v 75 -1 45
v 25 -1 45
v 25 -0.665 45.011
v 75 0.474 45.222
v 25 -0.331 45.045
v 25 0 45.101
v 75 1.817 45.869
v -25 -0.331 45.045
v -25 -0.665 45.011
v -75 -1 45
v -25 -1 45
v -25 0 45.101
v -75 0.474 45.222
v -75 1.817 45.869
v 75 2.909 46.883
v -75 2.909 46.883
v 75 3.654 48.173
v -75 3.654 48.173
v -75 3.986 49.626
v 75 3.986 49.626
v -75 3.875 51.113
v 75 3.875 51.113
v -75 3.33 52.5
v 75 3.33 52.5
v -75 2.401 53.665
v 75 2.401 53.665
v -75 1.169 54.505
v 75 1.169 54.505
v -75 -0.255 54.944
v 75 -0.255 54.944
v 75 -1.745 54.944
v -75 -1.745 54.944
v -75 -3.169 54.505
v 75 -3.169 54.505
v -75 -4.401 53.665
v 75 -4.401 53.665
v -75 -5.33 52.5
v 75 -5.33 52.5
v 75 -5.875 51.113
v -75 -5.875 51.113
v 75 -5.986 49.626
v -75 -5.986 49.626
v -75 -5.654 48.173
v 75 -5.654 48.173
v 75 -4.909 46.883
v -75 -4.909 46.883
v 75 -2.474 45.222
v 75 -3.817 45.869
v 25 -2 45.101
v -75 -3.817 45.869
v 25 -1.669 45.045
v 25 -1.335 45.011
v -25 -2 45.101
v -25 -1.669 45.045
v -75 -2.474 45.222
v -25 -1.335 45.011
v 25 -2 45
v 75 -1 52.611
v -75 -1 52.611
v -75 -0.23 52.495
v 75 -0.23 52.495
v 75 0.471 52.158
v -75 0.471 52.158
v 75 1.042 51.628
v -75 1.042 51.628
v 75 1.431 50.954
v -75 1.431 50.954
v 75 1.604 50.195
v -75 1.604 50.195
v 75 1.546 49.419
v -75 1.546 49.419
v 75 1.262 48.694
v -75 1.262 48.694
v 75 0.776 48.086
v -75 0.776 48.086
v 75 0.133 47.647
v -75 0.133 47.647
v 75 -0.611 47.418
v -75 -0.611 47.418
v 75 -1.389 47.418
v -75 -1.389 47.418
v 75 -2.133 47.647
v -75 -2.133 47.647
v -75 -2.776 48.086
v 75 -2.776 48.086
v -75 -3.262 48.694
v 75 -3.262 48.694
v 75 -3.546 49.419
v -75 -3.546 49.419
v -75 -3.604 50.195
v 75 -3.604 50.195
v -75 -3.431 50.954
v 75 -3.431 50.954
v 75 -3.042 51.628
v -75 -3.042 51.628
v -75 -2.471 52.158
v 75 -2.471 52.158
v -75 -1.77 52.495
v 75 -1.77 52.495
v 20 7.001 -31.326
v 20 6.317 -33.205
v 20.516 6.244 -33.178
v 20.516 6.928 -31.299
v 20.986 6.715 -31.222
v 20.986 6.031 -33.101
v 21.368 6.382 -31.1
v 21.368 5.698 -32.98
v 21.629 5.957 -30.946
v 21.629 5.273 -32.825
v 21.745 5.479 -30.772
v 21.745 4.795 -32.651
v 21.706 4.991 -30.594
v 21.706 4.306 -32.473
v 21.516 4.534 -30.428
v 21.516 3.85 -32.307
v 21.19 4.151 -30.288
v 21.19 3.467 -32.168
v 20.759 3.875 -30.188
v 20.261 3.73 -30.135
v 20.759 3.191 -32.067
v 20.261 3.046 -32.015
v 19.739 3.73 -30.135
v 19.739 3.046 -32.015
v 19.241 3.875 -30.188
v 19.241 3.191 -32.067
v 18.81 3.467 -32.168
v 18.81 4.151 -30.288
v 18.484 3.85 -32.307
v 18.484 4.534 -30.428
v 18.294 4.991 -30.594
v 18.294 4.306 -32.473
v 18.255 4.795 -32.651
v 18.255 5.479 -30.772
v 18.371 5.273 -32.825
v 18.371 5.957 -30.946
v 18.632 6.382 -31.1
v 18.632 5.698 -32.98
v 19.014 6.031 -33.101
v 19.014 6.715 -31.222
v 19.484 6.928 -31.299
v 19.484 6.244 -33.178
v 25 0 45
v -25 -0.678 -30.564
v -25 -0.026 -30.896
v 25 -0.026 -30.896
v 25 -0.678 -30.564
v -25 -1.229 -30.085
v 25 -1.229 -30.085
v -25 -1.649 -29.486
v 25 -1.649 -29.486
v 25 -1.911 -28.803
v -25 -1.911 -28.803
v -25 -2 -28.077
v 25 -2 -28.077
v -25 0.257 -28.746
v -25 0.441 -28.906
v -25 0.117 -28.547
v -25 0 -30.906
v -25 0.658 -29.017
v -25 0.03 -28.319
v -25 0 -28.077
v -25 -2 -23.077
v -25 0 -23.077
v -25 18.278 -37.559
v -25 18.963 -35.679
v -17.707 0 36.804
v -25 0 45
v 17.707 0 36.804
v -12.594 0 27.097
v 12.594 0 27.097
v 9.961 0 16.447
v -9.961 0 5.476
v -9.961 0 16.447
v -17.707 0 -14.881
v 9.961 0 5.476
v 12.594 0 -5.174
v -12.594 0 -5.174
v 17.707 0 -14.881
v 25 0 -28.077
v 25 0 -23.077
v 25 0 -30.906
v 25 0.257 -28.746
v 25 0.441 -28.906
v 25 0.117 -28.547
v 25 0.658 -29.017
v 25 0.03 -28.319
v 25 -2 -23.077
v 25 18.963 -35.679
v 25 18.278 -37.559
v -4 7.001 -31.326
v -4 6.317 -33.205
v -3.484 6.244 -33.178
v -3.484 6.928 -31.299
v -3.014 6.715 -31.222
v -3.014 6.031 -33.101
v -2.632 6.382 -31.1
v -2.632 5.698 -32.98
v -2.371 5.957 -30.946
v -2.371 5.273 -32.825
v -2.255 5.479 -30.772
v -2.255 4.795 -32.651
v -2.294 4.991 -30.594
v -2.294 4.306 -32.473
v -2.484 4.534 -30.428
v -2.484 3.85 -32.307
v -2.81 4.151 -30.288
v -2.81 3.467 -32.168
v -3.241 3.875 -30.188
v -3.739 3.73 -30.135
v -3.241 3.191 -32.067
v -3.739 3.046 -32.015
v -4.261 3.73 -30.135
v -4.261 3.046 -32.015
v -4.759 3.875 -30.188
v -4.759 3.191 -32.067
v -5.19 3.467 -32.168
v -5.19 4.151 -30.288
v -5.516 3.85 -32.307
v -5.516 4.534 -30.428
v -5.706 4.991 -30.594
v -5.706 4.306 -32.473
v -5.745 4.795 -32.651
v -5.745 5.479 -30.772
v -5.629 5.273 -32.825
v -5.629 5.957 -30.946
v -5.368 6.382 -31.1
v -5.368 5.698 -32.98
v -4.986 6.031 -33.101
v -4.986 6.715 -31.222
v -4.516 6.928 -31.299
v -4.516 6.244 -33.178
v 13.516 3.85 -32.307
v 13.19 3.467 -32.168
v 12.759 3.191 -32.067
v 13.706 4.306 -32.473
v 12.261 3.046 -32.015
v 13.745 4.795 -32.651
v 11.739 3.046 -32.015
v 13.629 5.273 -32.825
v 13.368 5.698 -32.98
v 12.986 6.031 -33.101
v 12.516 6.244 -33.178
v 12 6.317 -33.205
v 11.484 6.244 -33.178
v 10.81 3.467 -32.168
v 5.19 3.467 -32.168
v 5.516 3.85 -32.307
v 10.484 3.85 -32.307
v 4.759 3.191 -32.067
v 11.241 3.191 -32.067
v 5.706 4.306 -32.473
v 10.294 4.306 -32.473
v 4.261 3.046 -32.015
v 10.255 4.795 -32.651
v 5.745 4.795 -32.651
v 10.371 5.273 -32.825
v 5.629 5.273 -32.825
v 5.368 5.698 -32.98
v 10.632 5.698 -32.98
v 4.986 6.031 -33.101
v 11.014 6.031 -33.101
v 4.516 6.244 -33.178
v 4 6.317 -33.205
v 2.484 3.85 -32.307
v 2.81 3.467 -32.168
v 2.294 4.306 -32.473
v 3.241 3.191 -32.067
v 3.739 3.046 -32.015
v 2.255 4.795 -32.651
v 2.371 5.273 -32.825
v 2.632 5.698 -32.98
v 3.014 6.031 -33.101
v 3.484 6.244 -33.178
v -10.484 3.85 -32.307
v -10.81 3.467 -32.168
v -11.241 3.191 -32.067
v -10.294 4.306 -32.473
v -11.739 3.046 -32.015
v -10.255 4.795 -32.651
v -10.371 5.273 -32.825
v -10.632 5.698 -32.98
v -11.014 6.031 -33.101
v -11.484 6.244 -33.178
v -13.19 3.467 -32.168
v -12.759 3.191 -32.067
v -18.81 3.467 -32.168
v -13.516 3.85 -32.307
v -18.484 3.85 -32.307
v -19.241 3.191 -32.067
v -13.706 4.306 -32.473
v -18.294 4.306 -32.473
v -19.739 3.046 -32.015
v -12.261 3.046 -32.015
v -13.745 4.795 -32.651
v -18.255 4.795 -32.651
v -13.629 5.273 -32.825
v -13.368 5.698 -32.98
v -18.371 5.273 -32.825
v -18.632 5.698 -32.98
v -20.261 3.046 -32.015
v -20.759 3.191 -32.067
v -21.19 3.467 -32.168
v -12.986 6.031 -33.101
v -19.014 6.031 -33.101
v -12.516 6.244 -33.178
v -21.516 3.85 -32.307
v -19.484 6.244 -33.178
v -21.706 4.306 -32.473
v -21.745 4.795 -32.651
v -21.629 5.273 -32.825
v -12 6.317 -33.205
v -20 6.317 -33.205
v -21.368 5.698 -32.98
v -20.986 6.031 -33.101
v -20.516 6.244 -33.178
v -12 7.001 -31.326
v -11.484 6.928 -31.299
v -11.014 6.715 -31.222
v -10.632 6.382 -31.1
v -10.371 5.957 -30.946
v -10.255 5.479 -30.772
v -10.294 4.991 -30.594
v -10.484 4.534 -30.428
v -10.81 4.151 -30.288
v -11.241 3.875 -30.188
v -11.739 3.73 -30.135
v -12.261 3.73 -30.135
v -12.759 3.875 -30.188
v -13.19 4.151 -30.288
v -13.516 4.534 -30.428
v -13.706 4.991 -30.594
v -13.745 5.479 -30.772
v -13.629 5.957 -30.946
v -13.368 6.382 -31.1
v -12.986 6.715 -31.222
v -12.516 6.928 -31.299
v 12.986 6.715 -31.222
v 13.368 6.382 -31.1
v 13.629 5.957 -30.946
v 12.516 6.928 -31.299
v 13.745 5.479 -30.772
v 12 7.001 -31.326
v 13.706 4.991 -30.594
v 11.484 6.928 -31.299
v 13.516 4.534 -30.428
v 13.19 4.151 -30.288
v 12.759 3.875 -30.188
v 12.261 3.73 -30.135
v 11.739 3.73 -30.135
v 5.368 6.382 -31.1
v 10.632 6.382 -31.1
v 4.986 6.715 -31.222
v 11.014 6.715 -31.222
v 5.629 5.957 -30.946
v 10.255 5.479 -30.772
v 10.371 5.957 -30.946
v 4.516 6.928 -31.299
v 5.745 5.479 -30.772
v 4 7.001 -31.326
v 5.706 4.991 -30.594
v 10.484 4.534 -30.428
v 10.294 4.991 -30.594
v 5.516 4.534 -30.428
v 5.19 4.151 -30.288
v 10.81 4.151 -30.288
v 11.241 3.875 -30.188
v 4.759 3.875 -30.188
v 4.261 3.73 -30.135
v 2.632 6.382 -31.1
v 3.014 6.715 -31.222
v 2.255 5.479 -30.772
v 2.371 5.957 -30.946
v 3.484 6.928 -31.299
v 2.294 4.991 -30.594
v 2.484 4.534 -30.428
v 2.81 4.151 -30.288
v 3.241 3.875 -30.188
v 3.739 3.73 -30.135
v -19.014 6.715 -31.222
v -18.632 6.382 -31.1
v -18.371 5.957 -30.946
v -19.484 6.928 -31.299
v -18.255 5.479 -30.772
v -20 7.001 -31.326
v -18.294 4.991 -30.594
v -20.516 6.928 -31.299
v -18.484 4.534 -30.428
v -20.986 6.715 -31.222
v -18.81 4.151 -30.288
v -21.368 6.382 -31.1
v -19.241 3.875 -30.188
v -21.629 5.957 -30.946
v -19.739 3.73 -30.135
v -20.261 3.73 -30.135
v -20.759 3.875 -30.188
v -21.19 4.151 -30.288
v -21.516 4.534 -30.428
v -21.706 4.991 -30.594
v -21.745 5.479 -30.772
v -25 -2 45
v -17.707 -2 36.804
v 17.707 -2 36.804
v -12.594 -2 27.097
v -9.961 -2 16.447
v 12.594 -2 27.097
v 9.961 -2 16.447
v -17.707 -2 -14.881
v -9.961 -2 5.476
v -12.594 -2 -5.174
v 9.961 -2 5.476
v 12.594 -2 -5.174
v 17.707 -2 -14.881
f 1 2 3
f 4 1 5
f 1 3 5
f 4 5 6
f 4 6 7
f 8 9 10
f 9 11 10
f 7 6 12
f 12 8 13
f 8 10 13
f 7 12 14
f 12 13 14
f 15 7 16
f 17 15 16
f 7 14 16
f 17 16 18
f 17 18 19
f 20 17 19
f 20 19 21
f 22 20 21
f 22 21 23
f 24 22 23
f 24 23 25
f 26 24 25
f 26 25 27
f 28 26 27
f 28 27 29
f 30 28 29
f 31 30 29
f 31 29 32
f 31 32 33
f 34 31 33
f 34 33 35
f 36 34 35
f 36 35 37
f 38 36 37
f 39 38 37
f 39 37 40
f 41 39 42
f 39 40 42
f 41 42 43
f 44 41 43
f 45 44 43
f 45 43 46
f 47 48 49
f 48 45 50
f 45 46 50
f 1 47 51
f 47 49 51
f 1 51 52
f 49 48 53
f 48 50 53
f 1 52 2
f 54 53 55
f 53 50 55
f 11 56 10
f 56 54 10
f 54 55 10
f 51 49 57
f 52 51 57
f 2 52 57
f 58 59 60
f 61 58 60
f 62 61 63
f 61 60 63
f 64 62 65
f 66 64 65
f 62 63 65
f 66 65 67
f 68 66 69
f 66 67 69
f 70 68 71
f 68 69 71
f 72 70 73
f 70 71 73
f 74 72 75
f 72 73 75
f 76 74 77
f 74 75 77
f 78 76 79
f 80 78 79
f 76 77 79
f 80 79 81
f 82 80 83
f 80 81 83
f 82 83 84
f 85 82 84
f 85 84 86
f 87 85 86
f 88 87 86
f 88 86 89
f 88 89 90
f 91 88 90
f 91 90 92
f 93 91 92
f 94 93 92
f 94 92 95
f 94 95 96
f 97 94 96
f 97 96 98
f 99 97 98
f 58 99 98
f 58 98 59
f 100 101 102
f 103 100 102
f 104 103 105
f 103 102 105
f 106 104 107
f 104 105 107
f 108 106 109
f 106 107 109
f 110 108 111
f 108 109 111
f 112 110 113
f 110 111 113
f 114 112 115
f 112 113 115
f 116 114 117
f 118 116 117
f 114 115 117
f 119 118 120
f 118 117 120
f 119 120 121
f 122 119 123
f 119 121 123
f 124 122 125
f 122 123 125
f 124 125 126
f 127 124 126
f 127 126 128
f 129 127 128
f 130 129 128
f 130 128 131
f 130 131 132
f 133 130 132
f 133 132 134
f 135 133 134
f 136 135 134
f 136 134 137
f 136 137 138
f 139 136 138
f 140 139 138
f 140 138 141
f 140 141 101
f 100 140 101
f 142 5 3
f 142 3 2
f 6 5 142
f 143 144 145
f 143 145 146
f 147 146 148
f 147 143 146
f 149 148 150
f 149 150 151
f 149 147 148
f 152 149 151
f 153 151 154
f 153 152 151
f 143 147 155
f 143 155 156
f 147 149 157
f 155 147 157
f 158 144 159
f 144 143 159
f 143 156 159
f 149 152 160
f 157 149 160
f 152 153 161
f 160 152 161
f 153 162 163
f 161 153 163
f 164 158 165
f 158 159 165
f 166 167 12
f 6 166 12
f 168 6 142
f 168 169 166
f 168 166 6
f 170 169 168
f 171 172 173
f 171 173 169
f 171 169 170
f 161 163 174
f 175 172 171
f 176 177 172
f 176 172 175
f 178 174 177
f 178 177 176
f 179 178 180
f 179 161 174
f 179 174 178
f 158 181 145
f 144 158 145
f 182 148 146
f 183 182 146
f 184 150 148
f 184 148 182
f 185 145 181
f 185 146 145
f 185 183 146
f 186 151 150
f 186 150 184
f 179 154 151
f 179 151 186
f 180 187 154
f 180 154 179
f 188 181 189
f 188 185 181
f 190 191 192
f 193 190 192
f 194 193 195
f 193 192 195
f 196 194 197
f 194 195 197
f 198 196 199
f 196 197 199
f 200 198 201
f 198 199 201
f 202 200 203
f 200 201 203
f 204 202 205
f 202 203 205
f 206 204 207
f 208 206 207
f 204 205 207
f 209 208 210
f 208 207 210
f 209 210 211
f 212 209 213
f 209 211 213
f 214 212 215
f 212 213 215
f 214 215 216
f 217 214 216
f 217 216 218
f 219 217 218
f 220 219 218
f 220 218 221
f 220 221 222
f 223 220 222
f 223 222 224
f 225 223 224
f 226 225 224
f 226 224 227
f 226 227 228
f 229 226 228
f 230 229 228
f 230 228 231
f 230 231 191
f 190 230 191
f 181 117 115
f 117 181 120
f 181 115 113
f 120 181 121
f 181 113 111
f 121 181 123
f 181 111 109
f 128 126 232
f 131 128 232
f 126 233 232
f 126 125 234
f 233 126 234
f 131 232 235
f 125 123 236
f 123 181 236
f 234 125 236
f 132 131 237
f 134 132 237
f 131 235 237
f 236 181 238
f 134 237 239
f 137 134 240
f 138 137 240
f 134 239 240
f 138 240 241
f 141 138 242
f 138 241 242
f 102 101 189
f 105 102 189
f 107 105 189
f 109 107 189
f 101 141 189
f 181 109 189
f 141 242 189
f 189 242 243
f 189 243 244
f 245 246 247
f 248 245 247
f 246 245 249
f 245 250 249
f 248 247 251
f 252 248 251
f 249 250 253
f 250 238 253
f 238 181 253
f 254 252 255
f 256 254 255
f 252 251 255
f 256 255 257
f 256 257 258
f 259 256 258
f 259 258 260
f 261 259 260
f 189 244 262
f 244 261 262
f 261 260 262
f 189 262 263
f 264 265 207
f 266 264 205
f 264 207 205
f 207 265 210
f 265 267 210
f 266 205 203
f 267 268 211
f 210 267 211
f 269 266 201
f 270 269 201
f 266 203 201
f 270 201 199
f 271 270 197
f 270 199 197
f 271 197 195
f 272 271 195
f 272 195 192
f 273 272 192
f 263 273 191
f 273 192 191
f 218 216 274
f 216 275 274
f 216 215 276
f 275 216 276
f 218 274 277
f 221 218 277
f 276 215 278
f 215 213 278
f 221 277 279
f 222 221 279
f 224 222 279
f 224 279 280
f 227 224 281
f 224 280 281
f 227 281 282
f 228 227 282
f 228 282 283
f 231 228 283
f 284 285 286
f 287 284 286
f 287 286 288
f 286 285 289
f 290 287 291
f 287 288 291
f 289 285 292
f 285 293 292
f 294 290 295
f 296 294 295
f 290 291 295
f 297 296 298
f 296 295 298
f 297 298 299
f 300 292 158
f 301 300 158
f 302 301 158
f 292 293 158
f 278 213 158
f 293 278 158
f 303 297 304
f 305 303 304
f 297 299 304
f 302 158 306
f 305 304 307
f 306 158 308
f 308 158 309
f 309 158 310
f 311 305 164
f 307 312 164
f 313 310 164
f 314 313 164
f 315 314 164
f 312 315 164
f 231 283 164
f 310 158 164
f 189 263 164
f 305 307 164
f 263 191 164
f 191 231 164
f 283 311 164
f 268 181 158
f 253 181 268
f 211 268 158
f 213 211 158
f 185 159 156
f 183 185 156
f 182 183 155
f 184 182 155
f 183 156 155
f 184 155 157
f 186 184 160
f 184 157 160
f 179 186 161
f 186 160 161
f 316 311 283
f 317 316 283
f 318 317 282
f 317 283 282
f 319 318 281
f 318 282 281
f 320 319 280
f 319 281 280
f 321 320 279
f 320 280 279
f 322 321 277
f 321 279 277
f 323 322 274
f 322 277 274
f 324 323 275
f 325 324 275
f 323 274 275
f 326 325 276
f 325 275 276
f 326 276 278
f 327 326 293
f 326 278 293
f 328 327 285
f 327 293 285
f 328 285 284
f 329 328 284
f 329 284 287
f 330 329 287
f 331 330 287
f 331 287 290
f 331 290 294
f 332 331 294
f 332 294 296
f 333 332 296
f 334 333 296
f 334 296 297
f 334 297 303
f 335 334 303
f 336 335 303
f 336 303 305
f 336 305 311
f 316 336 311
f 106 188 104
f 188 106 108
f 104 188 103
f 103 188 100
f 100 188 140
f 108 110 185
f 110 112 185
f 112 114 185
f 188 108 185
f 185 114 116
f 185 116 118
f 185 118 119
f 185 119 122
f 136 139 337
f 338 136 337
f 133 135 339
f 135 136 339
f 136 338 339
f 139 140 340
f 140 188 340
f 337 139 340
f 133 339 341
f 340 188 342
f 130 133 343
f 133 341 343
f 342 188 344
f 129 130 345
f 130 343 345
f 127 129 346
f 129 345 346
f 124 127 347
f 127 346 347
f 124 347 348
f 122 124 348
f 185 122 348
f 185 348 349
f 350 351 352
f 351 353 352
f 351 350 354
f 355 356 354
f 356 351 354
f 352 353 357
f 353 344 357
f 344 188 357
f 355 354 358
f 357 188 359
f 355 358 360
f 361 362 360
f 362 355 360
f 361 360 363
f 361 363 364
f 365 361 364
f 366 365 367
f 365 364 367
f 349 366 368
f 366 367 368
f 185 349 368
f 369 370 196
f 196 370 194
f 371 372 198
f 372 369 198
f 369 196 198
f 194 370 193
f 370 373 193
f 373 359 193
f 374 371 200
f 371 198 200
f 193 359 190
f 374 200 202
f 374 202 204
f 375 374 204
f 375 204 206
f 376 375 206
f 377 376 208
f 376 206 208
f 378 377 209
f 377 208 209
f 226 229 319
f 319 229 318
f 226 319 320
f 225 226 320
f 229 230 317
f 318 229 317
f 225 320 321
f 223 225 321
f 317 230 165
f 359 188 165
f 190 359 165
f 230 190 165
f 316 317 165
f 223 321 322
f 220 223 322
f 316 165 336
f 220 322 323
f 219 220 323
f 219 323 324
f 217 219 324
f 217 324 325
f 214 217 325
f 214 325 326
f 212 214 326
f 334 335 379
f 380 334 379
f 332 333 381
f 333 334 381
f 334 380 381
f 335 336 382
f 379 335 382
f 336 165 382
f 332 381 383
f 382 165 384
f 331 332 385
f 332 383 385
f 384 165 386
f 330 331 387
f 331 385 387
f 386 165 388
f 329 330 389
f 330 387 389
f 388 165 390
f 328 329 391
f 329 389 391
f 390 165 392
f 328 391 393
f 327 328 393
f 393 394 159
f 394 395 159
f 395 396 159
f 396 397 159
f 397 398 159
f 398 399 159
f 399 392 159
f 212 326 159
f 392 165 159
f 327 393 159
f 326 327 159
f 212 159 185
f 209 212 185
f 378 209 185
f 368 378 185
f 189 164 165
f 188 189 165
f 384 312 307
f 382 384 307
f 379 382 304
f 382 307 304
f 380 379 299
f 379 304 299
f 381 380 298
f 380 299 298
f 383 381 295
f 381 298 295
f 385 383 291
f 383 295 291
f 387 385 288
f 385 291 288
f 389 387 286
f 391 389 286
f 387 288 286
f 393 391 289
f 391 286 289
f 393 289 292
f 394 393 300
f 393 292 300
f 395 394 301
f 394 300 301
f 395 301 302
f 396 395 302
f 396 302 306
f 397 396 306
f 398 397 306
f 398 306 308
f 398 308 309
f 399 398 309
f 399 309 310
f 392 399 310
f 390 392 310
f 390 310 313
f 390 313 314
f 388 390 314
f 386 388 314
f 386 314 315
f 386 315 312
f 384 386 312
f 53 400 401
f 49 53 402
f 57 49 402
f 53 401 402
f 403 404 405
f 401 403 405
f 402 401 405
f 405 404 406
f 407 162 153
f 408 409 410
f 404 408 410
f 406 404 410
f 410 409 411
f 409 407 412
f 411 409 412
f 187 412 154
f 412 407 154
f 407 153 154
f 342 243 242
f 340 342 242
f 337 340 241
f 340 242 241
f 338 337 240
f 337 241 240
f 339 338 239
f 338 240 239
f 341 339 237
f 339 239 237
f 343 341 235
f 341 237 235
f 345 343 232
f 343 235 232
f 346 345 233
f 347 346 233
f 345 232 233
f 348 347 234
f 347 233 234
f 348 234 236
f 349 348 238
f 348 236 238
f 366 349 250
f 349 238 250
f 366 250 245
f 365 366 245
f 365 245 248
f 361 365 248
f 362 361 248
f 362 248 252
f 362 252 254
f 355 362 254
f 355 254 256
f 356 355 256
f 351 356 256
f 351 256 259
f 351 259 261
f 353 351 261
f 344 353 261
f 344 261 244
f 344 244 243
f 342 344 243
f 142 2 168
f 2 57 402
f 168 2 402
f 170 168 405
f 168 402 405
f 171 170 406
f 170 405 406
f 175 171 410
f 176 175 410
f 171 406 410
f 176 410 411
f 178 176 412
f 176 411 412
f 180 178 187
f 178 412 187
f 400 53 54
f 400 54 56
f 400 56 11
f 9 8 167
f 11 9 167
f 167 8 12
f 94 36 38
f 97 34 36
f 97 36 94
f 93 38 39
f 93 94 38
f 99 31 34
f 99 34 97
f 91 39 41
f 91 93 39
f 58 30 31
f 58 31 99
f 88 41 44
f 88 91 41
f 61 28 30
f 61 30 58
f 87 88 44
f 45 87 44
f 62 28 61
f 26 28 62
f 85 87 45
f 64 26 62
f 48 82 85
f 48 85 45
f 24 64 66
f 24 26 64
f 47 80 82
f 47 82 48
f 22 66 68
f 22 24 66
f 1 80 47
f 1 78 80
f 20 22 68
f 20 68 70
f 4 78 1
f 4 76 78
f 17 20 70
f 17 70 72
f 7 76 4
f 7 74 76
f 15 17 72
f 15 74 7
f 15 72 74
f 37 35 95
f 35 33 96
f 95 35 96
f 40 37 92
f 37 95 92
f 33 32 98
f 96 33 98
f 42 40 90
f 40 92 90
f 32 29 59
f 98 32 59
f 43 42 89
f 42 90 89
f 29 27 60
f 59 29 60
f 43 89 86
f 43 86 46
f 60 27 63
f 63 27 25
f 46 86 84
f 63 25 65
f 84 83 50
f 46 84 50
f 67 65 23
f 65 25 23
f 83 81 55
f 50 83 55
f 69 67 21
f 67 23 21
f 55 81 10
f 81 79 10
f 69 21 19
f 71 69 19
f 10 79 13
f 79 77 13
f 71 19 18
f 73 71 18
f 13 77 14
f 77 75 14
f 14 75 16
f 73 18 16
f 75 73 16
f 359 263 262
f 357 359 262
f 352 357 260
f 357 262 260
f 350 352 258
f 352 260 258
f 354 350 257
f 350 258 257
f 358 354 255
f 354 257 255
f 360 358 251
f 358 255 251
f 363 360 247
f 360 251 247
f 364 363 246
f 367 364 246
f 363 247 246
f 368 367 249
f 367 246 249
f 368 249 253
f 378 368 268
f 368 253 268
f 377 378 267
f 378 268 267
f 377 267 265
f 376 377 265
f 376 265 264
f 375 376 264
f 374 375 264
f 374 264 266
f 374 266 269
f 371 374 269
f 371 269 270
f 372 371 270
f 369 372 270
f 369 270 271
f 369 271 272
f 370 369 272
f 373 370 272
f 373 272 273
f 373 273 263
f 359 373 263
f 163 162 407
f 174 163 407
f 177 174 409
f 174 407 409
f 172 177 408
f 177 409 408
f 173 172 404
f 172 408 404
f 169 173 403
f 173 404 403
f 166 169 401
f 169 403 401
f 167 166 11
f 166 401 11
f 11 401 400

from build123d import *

# Parameters (mm, degrees)
SKETCH1_W                = 50
SKETCH1_H                = 100
BASE_FLANGE1_DEPTH       = 2
SKETCHED_START           = -25
SKETCHED_BEND1_DEPTH     = 50
SKETCHED_BEND1_2_DEPTH   = 50
CUT_EXTRUDE2_DEPTH       = 60.702826072
BOSS_EXTRUDE2_DEPTH      = 75
BOSS_EXTRUDE2_DEPTH_BACK = 75
SKETCH9_R                = 5
SKETCH10_R               = 1.75
CUT_EXTRUDE3_DEPTH       = 116.029027735
SKETCH11_R               = 2.61136214
CUT_EXTRUDE4_DEPTH       = 161.886846393


# Read off the part's stored shape, not the designer's step: Sketched Bend1
# Sheet-metal steps are written as plain solids
with BuildPart() as part:
    # Sketch1 → Base-Flange1 (new body)
    with BuildSketch(Plane(origin=(0, 0, 0), x_dir=(1, 0, 0), z_dir=(0, 1, 0))):
        Rectangle(SKETCH1_W, SKETCH1_H)
    extrude(amount=-BASE_FLANGE1_DEPTH)

    # Sketched Bend1 outline → Sketched Bend1 (cut)
    with BuildSketch(Plane.YZ.offset(SKETCHED_START)):
        with BuildLine():
            Line((0, -50), (0, -30.905812394))
            Line((0, -30.905812394), (-0.02606043, -30.896327173))
            ThreePointArc((-0.02606043, -30.896327173), (-1.457456133, -29.79797862), (-2, -28.077249311))
            Line((-2, -28.077249311), (-2, -50))
            Line((-2, -50), (0, -50))
        make_face()
    extrude(amount=SKETCHED_BEND1_DEPTH, mode=Mode.SUBTRACT)

    # Sketched Bend1 2 outline → Sketched Bend1 2 (add)
    with BuildSketch(Plane.YZ.offset(SKETCHED_START)):
        with BuildLine():
            Line((0, -30.905812394), (18.278484393, -37.558636641))
            Line((18.278484393, -37.558636641), (18.96252468, -35.679251399))
            Line((18.96252468, -35.679251399), (0.657979857, -29.016941932))
            ThreePointArc((0.657979857, -29.016941932), (0.180847956, -28.650825747), (0, -28.077249311))
            Line((0, -28.077249311), (0, -30.905812394))
        make_face()
    extrude(amount=SKETCHED_BEND1_2_DEPTH)

    # Sketch8 → Cut-Extrude2 (cut, through all)
    with BuildSketch(Plane.XZ.offset(2)):
        with BuildLine():
            Line((-25, 45), (-25, -23.077249311))
            ThreePointArc((-25, -23.077249311), (-9.62789438, 10.961375345), (-25, 45))
        make_face()
        with BuildLine():
            Line((25, -23.077249311), (25, 45))
            ThreePointArc((25, 45), (9.62789438, 10.961375345), (25, -23.077249311))
        make_face()
    extrude(amount=-CUT_EXTRUDE2_DEPTH, mode=Mode.SUBTRACT)

    # Sketch9 → Boss-Extrude2 (add, two sides: drawn at the far end of the back side and taken through both)
    with BuildSketch(Plane(origin=(0, 0, 0), x_dir=(0, 0, -1), z_dir=(1, 0, 0)).offset(-BOSS_EXTRUDE2_DEPTH_BACK)):
        with Locations((-50, -1)):
            Circle(SKETCH9_R)
    extrude(amount=BOSS_EXTRUDE2_DEPTH + BOSS_EXTRUDE2_DEPTH_BACK)

    # Sketch10 → Cut-Extrude3 (cut, through all)
    with BuildSketch(Plane(origin=(0, -9.932936637, -27.290519119), x_dir=(-1, 0, 0), z_dir=(0, -0.34202014332566616, -0.9396926207859094))):
        with Locations(Location((-20, 15.542677454, 0), (0, 0, 90))):
            Circle(SKETCH10_R)
        with Locations(Location((-12, 15.542677454, 0), (0, 0, 90))):
            Circle(SKETCH10_R)
        with Locations(Location((-4, 15.542677454, 0), (0, 0, 90))):
            Circle(SKETCH10_R)
        with Locations(Location((4, 15.542677454, 0), (0, 0, 90))):
            Circle(SKETCH10_R)
        with Locations(Location((12, 15.542677454, 0), (0, 0, 90))):
            Circle(SKETCH10_R)
        with Locations(Location((20, 15.542677454, 0), (0, 0, 90))):
            Circle(SKETCH10_R)
    extrude(amount=-CUT_EXTRUDE3_DEPTH, mode=Mode.SUBTRACT)

    # Sketch11 → Cut-Extrude4 (cut, through all)
    with BuildSketch(Plane.ZY.offset(75)):
        with Locations((50, -1)):
            Circle(SKETCH11_R)
    extrude(amount=-CUT_EXTRUDE4_DEPTH, mode=Mode.SUBTRACT)


solid = part.part
